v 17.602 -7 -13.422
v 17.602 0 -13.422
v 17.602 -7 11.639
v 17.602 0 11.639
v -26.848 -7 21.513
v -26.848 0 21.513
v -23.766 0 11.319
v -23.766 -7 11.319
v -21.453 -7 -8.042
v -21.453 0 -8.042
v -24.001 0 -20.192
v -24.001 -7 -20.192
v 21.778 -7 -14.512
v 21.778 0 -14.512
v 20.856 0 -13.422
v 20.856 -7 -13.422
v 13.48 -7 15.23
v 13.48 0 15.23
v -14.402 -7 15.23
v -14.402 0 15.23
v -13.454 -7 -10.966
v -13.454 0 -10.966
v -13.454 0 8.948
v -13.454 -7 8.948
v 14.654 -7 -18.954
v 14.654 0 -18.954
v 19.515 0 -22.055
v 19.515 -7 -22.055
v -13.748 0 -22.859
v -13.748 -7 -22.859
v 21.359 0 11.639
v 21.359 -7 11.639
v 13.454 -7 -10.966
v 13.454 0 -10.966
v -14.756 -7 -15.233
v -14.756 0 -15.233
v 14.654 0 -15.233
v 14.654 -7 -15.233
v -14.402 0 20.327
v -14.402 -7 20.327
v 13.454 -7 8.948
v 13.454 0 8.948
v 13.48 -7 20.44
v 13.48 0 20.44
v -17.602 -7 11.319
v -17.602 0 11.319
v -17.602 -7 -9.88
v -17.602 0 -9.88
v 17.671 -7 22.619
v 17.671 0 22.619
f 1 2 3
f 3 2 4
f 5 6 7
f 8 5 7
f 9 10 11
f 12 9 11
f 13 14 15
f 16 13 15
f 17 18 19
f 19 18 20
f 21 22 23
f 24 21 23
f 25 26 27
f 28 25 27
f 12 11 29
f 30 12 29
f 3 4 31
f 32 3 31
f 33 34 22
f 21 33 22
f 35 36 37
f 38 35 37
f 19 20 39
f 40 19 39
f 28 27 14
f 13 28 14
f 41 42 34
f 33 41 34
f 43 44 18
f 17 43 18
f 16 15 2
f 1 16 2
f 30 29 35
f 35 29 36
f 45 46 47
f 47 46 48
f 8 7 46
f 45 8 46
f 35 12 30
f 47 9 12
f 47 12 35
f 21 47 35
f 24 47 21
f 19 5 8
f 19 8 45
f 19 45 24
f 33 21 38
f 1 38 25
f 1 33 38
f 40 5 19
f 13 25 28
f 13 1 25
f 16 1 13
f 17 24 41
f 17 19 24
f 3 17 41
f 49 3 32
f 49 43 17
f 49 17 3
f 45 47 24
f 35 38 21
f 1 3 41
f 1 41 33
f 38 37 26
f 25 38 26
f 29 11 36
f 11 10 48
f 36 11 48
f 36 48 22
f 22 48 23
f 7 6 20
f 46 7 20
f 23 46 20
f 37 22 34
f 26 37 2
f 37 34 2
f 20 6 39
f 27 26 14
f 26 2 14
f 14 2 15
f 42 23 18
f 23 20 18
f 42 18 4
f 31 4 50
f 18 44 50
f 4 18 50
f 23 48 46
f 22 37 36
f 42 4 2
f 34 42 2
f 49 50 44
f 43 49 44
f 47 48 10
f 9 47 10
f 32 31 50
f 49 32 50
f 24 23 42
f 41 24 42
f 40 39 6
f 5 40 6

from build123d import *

# Parameters (mm, degrees)
F1_DEPTH = 7


with BuildPart() as f1:
    # F0 (on Front) → F1 (new body)
    with BuildSketch(Plane.XZ):
        Polygon((13.480433, 15.230299), (0, 15.230299), (-14.4018, 15.230299), (-14.4018, 20.327233), (-26.8478, 21.512566), (-23.765933, 11.318699), (-17.6022, 11.318699), (-17.6022, -9.879558), (-21.452855, -8.042291), (-24.001321, -20.191958), (-13.748187, -22.858959), (-14.755721, -15.232768), (0, -15.232768), (14.653853, -15.232768), (14.653853, -18.953877), (19.515166, -22.05506), (21.778191, -14.511641), (20.856217, -13.422038), (17.6022, -13.422038), (17.6022, 11.638863), (21.359112, 11.638863), (17.67122, 22.618724), (13.480433, 20.439515), align=None)
        Polygon((-13.453534, 8.948033), (0, 8.948033), (13.453534, 8.948033), (13.453534, -10.965568), (0, -10.965568), (-13.453534, -10.965568), align=None, mode=Mode.SUBTRACT)
    extrude(amount=F1_DEPTH)


solid = f1.part
